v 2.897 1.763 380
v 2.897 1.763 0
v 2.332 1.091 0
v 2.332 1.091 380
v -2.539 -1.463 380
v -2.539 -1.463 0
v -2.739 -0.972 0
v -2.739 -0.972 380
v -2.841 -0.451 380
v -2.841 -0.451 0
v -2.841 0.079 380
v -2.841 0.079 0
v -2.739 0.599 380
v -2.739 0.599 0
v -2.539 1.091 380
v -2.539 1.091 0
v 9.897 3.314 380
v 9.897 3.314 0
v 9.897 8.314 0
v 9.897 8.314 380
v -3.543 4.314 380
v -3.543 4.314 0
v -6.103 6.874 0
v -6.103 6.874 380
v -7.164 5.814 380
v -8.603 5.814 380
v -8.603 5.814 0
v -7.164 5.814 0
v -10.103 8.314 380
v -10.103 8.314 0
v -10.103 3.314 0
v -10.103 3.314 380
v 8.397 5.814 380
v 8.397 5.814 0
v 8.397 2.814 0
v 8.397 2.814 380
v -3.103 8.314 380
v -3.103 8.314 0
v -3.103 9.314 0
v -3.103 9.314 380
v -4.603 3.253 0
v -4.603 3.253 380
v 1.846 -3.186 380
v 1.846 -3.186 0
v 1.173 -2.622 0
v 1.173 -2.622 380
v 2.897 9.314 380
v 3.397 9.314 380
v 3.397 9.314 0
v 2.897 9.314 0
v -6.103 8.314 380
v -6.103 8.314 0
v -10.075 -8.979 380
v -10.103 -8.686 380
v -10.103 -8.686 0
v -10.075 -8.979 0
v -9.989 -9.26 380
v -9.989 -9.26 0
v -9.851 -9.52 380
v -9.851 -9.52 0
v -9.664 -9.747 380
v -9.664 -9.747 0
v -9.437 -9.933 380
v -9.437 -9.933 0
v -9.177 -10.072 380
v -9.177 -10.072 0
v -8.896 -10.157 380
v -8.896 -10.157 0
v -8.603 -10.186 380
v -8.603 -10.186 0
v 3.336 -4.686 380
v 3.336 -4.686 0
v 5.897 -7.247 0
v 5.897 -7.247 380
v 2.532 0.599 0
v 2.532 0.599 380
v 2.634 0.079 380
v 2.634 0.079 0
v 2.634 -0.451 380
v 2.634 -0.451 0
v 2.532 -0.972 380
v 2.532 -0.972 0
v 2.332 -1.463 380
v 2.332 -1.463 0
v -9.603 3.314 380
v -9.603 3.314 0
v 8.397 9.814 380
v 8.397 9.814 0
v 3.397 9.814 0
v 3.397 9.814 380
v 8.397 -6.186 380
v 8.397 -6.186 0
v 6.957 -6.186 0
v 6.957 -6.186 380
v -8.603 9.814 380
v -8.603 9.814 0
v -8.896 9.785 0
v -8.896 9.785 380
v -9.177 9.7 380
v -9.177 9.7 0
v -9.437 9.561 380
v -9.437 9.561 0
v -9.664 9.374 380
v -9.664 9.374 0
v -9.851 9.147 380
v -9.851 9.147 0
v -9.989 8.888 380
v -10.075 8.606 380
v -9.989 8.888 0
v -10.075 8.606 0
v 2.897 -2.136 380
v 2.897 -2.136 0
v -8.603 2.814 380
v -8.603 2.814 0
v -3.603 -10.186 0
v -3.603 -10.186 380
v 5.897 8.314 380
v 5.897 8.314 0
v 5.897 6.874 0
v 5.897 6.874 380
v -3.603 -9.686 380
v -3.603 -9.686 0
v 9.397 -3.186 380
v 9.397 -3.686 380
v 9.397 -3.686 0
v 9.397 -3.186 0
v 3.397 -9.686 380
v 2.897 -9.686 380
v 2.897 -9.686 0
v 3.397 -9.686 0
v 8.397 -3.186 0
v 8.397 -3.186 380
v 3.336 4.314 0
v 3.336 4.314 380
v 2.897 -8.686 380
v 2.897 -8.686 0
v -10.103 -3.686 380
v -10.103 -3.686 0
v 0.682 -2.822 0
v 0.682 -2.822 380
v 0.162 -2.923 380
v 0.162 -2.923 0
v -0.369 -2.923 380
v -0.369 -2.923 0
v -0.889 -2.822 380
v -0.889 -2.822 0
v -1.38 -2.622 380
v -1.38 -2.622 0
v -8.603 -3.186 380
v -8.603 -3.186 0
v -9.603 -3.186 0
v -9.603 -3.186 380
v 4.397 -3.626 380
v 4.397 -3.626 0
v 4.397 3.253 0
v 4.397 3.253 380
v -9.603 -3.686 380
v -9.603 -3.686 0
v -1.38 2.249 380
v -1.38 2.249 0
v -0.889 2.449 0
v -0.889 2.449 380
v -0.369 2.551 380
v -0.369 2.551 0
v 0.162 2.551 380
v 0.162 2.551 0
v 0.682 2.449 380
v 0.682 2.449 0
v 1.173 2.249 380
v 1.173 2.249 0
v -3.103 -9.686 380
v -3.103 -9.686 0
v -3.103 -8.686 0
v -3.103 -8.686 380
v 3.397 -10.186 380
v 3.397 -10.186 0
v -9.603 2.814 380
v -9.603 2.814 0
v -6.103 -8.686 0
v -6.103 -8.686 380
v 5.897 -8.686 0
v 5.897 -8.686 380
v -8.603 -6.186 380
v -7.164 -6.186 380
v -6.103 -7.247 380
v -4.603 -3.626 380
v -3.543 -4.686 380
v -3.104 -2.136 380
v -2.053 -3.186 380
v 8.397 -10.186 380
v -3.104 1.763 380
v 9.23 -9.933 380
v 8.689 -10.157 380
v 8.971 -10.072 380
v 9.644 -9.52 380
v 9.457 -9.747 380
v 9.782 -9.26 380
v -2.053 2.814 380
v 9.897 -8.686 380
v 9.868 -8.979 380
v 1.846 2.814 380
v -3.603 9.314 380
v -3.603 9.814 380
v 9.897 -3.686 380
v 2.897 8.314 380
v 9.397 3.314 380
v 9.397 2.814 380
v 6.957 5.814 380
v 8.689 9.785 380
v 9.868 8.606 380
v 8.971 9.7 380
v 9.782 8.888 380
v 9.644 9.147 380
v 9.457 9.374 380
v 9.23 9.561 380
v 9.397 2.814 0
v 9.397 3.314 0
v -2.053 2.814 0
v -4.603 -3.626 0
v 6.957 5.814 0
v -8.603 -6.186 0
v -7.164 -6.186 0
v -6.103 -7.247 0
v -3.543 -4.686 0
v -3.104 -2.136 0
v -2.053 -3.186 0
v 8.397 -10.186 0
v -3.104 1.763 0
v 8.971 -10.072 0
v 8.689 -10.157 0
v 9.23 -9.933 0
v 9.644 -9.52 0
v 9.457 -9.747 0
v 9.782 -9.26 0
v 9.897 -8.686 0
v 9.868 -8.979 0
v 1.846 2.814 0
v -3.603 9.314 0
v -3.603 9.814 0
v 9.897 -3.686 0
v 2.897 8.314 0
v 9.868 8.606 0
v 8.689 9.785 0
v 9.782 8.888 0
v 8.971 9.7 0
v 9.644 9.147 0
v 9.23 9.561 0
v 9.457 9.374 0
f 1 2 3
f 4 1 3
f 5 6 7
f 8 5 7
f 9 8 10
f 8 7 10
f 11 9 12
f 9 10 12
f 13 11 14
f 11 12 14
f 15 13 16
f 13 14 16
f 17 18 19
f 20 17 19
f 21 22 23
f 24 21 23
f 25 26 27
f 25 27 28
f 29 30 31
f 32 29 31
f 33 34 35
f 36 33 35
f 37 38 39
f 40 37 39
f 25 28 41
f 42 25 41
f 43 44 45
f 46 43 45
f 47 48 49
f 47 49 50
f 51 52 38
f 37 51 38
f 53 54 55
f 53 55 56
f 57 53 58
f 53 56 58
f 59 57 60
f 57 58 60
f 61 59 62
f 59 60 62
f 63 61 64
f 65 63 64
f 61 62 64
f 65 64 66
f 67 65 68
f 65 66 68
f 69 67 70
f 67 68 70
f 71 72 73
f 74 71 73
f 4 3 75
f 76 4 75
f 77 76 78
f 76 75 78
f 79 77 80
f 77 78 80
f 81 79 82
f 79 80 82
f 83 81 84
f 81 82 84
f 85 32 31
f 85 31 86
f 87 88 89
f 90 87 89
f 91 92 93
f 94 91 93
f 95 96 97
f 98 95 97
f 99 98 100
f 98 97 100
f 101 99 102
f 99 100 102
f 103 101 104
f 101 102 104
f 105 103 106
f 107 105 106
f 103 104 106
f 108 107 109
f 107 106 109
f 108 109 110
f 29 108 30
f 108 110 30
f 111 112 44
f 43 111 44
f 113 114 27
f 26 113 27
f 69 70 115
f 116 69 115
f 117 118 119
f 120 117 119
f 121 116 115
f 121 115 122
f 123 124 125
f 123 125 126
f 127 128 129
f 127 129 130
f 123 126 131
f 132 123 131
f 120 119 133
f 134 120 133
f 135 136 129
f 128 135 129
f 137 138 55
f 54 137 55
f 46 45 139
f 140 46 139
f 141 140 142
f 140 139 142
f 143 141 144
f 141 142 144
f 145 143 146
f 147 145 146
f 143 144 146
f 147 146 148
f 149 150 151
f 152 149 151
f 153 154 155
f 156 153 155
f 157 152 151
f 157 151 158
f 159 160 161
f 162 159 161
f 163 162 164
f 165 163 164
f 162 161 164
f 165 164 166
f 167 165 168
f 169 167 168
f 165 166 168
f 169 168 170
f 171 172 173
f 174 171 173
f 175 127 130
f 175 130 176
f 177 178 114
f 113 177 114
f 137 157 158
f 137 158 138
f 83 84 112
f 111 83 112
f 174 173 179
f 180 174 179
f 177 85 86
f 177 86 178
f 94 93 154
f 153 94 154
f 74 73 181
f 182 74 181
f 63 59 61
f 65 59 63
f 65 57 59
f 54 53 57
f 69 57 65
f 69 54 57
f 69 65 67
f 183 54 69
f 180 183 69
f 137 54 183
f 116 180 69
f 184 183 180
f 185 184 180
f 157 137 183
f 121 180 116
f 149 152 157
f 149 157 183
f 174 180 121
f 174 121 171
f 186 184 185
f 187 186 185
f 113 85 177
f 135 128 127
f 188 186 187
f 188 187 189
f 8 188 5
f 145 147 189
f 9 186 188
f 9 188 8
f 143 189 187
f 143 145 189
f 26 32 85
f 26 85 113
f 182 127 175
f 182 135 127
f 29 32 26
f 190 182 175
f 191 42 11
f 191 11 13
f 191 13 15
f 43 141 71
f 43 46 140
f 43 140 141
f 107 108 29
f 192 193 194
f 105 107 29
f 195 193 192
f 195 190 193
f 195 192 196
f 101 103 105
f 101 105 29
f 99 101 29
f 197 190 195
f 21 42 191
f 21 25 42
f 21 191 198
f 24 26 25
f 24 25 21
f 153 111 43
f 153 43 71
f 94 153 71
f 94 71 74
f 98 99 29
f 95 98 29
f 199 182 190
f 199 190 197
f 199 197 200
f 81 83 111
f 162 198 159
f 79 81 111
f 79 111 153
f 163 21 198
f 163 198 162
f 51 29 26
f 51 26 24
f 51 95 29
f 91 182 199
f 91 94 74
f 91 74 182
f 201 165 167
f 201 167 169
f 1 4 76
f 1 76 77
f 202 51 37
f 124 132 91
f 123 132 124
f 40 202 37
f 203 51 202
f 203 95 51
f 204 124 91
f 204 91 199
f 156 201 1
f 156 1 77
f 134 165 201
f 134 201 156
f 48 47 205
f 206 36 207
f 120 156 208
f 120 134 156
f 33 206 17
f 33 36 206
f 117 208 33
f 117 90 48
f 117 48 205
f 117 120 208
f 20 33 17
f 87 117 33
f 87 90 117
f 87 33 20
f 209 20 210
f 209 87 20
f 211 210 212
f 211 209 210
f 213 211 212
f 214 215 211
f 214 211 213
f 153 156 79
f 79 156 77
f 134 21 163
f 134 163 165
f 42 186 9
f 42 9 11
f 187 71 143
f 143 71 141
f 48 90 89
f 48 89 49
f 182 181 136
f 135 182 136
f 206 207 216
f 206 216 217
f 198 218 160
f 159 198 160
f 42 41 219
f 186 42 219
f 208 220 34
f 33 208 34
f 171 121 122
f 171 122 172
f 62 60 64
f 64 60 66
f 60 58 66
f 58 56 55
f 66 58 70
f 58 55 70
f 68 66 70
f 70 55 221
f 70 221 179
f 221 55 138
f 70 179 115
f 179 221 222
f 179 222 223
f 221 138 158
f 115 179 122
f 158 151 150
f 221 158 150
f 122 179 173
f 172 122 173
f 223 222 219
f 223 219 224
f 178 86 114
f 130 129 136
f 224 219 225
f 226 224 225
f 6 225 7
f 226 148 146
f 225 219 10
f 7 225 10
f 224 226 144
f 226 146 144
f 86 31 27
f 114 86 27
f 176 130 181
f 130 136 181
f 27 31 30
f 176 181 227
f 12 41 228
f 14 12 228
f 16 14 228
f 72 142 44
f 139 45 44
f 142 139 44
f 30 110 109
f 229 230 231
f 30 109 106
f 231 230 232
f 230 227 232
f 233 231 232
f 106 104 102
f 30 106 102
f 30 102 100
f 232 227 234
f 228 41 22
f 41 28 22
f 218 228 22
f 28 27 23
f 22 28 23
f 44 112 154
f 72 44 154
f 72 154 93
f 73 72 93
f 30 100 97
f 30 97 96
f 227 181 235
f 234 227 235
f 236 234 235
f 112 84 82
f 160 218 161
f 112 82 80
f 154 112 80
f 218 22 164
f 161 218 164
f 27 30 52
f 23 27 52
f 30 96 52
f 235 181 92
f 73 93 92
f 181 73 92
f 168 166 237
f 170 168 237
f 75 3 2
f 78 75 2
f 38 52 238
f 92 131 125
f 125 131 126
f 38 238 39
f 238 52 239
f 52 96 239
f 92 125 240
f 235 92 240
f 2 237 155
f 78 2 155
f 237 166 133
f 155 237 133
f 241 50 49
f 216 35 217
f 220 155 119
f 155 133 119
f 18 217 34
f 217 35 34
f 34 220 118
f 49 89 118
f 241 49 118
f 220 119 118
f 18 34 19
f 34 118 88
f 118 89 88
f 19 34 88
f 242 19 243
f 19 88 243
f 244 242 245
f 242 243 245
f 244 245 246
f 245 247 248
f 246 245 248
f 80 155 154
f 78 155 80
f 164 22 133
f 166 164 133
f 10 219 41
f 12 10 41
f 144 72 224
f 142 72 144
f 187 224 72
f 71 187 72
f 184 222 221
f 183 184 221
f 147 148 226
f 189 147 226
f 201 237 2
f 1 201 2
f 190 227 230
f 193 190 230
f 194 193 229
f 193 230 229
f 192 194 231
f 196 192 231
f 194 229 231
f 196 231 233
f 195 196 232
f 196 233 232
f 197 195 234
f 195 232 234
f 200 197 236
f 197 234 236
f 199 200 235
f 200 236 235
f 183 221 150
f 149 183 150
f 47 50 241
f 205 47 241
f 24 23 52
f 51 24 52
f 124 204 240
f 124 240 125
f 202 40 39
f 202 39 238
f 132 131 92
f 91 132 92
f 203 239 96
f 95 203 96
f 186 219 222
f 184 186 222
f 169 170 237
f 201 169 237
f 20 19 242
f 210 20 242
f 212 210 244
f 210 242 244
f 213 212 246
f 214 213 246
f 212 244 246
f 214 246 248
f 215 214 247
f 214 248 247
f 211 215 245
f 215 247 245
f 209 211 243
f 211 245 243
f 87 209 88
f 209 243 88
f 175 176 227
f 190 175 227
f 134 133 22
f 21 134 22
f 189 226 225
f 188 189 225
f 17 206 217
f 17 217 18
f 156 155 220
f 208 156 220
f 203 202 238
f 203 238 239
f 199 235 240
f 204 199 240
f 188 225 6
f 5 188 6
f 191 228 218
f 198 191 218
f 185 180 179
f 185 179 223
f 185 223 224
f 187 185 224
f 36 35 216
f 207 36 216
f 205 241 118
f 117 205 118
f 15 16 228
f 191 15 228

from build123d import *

# Parameters (mm, degrees)
AUFSATZ_LINEAR_AUSTRAGEN1_DEPTH = 380


with BuildPart() as part:
    # Skizze1 → Aufsatz-Linear austragen1 (new body)
    with BuildSketch(Plane.XY):
        with BuildLine():
            Line((9.896623228, -8.686160957), (9.896623228, -3.686160957))
            Line((9.896623228, -3.686160957), (9.396623228, -3.686160957))
            Line((9.396623228, -3.686160957), (9.396623228, -3.186160957))
            Line((9.396623228, -3.186160957), (8.396623228, -3.186160957))
            Line((8.396623228, -3.186160957), (8.396623228, -6.186160957))
            Line((8.396623228, -6.186160957), (6.957283398, -6.186160957))
            Line((6.957283398, -6.186160957), (4.396623228, -3.625500787))
            Line((4.396623228, -3.625500787), (4.396623228, 3.253178873))
            Line((4.396623228, 3.253178873), (6.957283398, 5.813839043))
            Line((6.957283398, 5.813839043), (8.396623228, 5.813839043))
            Line((8.396623228, 5.813839043), (8.396623228, 2.813839043))
            Line((8.396623228, 2.813839043), (9.396623228, 2.813839043))
            Line((9.396623228, 2.813839043), (9.396623228, 3.313839043))
            Line((9.396623228, 3.313839043), (9.896623228, 3.313839043))
            Line((9.896623228, 3.313839043), (9.896623228, 8.313839043))
            ThreePointArc((9.896623228, 8.313839043), (9.457283398, 9.374499213), (8.396623228, 9.813839043))
            Line((8.396623228, 9.813839043), (3.396623228, 9.813839043))
            Line((3.396623228, 9.813839043), (3.396623228, 9.313839043))
            Line((3.396623228, 9.313839043), (2.896623228, 9.313839043))
            Line((2.896623228, 9.313839043), (2.896623228, 8.313839043))
            Line((2.896623228, 8.313839043), (5.896623228, 8.313839043))
            Line((5.896623228, 8.313839043), (5.896623228, 6.874499213))
            Line((5.896623228, 6.874499213), (3.335963058, 4.313839043))
            Line((3.335963058, 4.313839043), (-3.542716602, 4.313839043))
            Line((-3.542716602, 4.313839043), (-6.103376772, 6.874499213))
            Line((-6.103376772, 6.874499213), (-6.103376772, 8.313839043))
            Line((-6.103376772, 8.313839043), (-3.103376772, 8.313839043))
            Line((-3.103376772, 8.313839043), (-3.103376772, 9.313839043))
            Line((-3.103376772, 9.313839043), (-3.603376772, 9.313839043))
            Line((-3.603376772, 9.313839043), (-3.603376772, 9.813839043))
            Line((-3.603376772, 9.813839043), (-8.603376772, 9.813839043))
            ThreePointArc((-8.603376772, 9.813839043), (-9.664036942, 9.374499213), (-10.103376772, 8.313839043))
            Line((-10.103376772, 8.313839043), (-10.103376772, 3.313839043))
            Line((-10.103376772, 3.313839043), (-9.603376772, 3.313839043))
            Line((-9.603376772, 3.313839043), (-9.603376772, 2.813839043))
            Line((-9.603376772, 2.813839043), (-8.603376772, 2.813839043))
            Line((-8.603376772, 2.813839043), (-8.603376772, 5.813839043))
            Line((-8.603376772, 5.813839043), (-7.164036942, 5.813839043))
            Line((-7.164036942, 5.813839043), (-4.603376772, 3.253178873))
            Line((-4.603376772, 3.253178873), (-4.603376772, -3.625500787))
            Line((-4.603376772, -3.625500787), (-7.164036942, -6.186160957))
            Line((-7.164036942, -6.186160957), (-8.603376772, -6.186160957))
            Line((-8.603376772, -6.186160957), (-8.603376772, -3.186160957))
            Line((-8.603376772, -3.186160957), (-9.603376772, -3.186160957))
            Line((-9.603376772, -3.186160957), (-9.603376772, -3.686160957))
            Line((-9.603376772, -3.686160957), (-10.103376772, -3.686160957))
            Line((-10.103376772, -3.686160957), (-10.103376772, -8.686160957))
            ThreePointArc((-10.103376772, -8.686160957), (-9.664036942, -9.746821127), (-8.603376772, -10.186160957))
            Line((-8.603376772, -10.186160957), (-3.603376772, -10.186160957))
            Line((-3.603376772, -10.186160957), (-3.603376772, -9.686160957))
            Line((-3.603376772, -9.686160957), (-3.103376772, -9.686160957))
            Line((-3.103376772, -9.686160957), (-3.103376772, -8.686160957))
            Line((-3.103376772, -8.686160957), (-6.103376772, -8.686160957))
            Line((-6.103376772, -8.686160957), (-6.103376772, -7.246821127))
            Line((-6.103376772, -7.246821127), (-3.542716602, -4.686160957))
            Line((-3.542716602, -4.686160957), (3.335963058, -4.686160957))
            Line((3.335963058, -4.686160957), (5.896623228, -7.246821127))
            Line((5.896623228, -7.246821127), (5.896623228, -8.686160957))
            Line((5.896623228, -8.686160957), (2.896623228, -8.686160957))
            Line((2.896623228, -8.686160957), (2.896623228, -9.686160957))
            Line((2.896623228, -9.686160957), (3.396623228, -9.686160957))
            Line((3.396623228, -9.686160957), (3.396623228, -10.186160957))
            Line((3.396623228, -10.186160957), (8.396623228, -10.186160957))
            ThreePointArc((8.396623228, -10.186160957), (9.457283398, -9.746821127), (9.896623228, -8.686160957))
        make_face()
        with BuildLine():
            Line((-2.539013132, 1.090622313), (-3.103550972, 1.763412313))
            Line((-3.103550972, 1.763412313), (-2.052950042, 2.814013243))
            Line((-2.052950042, 2.814013243), (-1.380160042, 2.249475403))
            ThreePointArc((-1.380160042, 2.249475403), (-0.103376772, 2.563839041), (1.173406498, 2.249475399))
            Line((1.173406498, 2.249475399), (1.846196498, 2.814013239))
            Line((1.846196498, 2.814013239), (2.896797428, 1.763412309))
            Line((2.896797428, 1.763412309), (2.332259586, 1.09062231))
            ThreePointArc((2.332259586, 1.09062231), (2.646623225, -0.186160958), (2.332259587, -1.462944226))
            Line((2.332259587, -1.462944226), (2.896797427, -2.135734226))
            Line((2.896797427, -2.135734226), (1.846196497, -3.186335156))
            Line((1.846196497, -3.186335156), (1.173406497, -2.621797316))
            ThreePointArc((1.173406497, -2.621797316), (-0.103376773, -2.936160957), (-1.380160043, -2.62179732))
            Line((-1.380160043, -2.62179732), (-2.052950043, -3.18633516))
            Line((-2.052950043, -3.18633516), (-3.103550973, -2.13573423))
            Line((-3.103550973, -2.13573423), (-2.539013133, -1.46294423))
            ThreePointArc((-2.539013133, -1.46294423), (-2.853376773, -0.186160958), (-2.539013132, 1.090622313))
        make_face(mode=Mode.SUBTRACT)
    extrude(amount=AUFSATZ_LINEAR_AUSTRAGEN1_DEPTH)


solid = part.part
